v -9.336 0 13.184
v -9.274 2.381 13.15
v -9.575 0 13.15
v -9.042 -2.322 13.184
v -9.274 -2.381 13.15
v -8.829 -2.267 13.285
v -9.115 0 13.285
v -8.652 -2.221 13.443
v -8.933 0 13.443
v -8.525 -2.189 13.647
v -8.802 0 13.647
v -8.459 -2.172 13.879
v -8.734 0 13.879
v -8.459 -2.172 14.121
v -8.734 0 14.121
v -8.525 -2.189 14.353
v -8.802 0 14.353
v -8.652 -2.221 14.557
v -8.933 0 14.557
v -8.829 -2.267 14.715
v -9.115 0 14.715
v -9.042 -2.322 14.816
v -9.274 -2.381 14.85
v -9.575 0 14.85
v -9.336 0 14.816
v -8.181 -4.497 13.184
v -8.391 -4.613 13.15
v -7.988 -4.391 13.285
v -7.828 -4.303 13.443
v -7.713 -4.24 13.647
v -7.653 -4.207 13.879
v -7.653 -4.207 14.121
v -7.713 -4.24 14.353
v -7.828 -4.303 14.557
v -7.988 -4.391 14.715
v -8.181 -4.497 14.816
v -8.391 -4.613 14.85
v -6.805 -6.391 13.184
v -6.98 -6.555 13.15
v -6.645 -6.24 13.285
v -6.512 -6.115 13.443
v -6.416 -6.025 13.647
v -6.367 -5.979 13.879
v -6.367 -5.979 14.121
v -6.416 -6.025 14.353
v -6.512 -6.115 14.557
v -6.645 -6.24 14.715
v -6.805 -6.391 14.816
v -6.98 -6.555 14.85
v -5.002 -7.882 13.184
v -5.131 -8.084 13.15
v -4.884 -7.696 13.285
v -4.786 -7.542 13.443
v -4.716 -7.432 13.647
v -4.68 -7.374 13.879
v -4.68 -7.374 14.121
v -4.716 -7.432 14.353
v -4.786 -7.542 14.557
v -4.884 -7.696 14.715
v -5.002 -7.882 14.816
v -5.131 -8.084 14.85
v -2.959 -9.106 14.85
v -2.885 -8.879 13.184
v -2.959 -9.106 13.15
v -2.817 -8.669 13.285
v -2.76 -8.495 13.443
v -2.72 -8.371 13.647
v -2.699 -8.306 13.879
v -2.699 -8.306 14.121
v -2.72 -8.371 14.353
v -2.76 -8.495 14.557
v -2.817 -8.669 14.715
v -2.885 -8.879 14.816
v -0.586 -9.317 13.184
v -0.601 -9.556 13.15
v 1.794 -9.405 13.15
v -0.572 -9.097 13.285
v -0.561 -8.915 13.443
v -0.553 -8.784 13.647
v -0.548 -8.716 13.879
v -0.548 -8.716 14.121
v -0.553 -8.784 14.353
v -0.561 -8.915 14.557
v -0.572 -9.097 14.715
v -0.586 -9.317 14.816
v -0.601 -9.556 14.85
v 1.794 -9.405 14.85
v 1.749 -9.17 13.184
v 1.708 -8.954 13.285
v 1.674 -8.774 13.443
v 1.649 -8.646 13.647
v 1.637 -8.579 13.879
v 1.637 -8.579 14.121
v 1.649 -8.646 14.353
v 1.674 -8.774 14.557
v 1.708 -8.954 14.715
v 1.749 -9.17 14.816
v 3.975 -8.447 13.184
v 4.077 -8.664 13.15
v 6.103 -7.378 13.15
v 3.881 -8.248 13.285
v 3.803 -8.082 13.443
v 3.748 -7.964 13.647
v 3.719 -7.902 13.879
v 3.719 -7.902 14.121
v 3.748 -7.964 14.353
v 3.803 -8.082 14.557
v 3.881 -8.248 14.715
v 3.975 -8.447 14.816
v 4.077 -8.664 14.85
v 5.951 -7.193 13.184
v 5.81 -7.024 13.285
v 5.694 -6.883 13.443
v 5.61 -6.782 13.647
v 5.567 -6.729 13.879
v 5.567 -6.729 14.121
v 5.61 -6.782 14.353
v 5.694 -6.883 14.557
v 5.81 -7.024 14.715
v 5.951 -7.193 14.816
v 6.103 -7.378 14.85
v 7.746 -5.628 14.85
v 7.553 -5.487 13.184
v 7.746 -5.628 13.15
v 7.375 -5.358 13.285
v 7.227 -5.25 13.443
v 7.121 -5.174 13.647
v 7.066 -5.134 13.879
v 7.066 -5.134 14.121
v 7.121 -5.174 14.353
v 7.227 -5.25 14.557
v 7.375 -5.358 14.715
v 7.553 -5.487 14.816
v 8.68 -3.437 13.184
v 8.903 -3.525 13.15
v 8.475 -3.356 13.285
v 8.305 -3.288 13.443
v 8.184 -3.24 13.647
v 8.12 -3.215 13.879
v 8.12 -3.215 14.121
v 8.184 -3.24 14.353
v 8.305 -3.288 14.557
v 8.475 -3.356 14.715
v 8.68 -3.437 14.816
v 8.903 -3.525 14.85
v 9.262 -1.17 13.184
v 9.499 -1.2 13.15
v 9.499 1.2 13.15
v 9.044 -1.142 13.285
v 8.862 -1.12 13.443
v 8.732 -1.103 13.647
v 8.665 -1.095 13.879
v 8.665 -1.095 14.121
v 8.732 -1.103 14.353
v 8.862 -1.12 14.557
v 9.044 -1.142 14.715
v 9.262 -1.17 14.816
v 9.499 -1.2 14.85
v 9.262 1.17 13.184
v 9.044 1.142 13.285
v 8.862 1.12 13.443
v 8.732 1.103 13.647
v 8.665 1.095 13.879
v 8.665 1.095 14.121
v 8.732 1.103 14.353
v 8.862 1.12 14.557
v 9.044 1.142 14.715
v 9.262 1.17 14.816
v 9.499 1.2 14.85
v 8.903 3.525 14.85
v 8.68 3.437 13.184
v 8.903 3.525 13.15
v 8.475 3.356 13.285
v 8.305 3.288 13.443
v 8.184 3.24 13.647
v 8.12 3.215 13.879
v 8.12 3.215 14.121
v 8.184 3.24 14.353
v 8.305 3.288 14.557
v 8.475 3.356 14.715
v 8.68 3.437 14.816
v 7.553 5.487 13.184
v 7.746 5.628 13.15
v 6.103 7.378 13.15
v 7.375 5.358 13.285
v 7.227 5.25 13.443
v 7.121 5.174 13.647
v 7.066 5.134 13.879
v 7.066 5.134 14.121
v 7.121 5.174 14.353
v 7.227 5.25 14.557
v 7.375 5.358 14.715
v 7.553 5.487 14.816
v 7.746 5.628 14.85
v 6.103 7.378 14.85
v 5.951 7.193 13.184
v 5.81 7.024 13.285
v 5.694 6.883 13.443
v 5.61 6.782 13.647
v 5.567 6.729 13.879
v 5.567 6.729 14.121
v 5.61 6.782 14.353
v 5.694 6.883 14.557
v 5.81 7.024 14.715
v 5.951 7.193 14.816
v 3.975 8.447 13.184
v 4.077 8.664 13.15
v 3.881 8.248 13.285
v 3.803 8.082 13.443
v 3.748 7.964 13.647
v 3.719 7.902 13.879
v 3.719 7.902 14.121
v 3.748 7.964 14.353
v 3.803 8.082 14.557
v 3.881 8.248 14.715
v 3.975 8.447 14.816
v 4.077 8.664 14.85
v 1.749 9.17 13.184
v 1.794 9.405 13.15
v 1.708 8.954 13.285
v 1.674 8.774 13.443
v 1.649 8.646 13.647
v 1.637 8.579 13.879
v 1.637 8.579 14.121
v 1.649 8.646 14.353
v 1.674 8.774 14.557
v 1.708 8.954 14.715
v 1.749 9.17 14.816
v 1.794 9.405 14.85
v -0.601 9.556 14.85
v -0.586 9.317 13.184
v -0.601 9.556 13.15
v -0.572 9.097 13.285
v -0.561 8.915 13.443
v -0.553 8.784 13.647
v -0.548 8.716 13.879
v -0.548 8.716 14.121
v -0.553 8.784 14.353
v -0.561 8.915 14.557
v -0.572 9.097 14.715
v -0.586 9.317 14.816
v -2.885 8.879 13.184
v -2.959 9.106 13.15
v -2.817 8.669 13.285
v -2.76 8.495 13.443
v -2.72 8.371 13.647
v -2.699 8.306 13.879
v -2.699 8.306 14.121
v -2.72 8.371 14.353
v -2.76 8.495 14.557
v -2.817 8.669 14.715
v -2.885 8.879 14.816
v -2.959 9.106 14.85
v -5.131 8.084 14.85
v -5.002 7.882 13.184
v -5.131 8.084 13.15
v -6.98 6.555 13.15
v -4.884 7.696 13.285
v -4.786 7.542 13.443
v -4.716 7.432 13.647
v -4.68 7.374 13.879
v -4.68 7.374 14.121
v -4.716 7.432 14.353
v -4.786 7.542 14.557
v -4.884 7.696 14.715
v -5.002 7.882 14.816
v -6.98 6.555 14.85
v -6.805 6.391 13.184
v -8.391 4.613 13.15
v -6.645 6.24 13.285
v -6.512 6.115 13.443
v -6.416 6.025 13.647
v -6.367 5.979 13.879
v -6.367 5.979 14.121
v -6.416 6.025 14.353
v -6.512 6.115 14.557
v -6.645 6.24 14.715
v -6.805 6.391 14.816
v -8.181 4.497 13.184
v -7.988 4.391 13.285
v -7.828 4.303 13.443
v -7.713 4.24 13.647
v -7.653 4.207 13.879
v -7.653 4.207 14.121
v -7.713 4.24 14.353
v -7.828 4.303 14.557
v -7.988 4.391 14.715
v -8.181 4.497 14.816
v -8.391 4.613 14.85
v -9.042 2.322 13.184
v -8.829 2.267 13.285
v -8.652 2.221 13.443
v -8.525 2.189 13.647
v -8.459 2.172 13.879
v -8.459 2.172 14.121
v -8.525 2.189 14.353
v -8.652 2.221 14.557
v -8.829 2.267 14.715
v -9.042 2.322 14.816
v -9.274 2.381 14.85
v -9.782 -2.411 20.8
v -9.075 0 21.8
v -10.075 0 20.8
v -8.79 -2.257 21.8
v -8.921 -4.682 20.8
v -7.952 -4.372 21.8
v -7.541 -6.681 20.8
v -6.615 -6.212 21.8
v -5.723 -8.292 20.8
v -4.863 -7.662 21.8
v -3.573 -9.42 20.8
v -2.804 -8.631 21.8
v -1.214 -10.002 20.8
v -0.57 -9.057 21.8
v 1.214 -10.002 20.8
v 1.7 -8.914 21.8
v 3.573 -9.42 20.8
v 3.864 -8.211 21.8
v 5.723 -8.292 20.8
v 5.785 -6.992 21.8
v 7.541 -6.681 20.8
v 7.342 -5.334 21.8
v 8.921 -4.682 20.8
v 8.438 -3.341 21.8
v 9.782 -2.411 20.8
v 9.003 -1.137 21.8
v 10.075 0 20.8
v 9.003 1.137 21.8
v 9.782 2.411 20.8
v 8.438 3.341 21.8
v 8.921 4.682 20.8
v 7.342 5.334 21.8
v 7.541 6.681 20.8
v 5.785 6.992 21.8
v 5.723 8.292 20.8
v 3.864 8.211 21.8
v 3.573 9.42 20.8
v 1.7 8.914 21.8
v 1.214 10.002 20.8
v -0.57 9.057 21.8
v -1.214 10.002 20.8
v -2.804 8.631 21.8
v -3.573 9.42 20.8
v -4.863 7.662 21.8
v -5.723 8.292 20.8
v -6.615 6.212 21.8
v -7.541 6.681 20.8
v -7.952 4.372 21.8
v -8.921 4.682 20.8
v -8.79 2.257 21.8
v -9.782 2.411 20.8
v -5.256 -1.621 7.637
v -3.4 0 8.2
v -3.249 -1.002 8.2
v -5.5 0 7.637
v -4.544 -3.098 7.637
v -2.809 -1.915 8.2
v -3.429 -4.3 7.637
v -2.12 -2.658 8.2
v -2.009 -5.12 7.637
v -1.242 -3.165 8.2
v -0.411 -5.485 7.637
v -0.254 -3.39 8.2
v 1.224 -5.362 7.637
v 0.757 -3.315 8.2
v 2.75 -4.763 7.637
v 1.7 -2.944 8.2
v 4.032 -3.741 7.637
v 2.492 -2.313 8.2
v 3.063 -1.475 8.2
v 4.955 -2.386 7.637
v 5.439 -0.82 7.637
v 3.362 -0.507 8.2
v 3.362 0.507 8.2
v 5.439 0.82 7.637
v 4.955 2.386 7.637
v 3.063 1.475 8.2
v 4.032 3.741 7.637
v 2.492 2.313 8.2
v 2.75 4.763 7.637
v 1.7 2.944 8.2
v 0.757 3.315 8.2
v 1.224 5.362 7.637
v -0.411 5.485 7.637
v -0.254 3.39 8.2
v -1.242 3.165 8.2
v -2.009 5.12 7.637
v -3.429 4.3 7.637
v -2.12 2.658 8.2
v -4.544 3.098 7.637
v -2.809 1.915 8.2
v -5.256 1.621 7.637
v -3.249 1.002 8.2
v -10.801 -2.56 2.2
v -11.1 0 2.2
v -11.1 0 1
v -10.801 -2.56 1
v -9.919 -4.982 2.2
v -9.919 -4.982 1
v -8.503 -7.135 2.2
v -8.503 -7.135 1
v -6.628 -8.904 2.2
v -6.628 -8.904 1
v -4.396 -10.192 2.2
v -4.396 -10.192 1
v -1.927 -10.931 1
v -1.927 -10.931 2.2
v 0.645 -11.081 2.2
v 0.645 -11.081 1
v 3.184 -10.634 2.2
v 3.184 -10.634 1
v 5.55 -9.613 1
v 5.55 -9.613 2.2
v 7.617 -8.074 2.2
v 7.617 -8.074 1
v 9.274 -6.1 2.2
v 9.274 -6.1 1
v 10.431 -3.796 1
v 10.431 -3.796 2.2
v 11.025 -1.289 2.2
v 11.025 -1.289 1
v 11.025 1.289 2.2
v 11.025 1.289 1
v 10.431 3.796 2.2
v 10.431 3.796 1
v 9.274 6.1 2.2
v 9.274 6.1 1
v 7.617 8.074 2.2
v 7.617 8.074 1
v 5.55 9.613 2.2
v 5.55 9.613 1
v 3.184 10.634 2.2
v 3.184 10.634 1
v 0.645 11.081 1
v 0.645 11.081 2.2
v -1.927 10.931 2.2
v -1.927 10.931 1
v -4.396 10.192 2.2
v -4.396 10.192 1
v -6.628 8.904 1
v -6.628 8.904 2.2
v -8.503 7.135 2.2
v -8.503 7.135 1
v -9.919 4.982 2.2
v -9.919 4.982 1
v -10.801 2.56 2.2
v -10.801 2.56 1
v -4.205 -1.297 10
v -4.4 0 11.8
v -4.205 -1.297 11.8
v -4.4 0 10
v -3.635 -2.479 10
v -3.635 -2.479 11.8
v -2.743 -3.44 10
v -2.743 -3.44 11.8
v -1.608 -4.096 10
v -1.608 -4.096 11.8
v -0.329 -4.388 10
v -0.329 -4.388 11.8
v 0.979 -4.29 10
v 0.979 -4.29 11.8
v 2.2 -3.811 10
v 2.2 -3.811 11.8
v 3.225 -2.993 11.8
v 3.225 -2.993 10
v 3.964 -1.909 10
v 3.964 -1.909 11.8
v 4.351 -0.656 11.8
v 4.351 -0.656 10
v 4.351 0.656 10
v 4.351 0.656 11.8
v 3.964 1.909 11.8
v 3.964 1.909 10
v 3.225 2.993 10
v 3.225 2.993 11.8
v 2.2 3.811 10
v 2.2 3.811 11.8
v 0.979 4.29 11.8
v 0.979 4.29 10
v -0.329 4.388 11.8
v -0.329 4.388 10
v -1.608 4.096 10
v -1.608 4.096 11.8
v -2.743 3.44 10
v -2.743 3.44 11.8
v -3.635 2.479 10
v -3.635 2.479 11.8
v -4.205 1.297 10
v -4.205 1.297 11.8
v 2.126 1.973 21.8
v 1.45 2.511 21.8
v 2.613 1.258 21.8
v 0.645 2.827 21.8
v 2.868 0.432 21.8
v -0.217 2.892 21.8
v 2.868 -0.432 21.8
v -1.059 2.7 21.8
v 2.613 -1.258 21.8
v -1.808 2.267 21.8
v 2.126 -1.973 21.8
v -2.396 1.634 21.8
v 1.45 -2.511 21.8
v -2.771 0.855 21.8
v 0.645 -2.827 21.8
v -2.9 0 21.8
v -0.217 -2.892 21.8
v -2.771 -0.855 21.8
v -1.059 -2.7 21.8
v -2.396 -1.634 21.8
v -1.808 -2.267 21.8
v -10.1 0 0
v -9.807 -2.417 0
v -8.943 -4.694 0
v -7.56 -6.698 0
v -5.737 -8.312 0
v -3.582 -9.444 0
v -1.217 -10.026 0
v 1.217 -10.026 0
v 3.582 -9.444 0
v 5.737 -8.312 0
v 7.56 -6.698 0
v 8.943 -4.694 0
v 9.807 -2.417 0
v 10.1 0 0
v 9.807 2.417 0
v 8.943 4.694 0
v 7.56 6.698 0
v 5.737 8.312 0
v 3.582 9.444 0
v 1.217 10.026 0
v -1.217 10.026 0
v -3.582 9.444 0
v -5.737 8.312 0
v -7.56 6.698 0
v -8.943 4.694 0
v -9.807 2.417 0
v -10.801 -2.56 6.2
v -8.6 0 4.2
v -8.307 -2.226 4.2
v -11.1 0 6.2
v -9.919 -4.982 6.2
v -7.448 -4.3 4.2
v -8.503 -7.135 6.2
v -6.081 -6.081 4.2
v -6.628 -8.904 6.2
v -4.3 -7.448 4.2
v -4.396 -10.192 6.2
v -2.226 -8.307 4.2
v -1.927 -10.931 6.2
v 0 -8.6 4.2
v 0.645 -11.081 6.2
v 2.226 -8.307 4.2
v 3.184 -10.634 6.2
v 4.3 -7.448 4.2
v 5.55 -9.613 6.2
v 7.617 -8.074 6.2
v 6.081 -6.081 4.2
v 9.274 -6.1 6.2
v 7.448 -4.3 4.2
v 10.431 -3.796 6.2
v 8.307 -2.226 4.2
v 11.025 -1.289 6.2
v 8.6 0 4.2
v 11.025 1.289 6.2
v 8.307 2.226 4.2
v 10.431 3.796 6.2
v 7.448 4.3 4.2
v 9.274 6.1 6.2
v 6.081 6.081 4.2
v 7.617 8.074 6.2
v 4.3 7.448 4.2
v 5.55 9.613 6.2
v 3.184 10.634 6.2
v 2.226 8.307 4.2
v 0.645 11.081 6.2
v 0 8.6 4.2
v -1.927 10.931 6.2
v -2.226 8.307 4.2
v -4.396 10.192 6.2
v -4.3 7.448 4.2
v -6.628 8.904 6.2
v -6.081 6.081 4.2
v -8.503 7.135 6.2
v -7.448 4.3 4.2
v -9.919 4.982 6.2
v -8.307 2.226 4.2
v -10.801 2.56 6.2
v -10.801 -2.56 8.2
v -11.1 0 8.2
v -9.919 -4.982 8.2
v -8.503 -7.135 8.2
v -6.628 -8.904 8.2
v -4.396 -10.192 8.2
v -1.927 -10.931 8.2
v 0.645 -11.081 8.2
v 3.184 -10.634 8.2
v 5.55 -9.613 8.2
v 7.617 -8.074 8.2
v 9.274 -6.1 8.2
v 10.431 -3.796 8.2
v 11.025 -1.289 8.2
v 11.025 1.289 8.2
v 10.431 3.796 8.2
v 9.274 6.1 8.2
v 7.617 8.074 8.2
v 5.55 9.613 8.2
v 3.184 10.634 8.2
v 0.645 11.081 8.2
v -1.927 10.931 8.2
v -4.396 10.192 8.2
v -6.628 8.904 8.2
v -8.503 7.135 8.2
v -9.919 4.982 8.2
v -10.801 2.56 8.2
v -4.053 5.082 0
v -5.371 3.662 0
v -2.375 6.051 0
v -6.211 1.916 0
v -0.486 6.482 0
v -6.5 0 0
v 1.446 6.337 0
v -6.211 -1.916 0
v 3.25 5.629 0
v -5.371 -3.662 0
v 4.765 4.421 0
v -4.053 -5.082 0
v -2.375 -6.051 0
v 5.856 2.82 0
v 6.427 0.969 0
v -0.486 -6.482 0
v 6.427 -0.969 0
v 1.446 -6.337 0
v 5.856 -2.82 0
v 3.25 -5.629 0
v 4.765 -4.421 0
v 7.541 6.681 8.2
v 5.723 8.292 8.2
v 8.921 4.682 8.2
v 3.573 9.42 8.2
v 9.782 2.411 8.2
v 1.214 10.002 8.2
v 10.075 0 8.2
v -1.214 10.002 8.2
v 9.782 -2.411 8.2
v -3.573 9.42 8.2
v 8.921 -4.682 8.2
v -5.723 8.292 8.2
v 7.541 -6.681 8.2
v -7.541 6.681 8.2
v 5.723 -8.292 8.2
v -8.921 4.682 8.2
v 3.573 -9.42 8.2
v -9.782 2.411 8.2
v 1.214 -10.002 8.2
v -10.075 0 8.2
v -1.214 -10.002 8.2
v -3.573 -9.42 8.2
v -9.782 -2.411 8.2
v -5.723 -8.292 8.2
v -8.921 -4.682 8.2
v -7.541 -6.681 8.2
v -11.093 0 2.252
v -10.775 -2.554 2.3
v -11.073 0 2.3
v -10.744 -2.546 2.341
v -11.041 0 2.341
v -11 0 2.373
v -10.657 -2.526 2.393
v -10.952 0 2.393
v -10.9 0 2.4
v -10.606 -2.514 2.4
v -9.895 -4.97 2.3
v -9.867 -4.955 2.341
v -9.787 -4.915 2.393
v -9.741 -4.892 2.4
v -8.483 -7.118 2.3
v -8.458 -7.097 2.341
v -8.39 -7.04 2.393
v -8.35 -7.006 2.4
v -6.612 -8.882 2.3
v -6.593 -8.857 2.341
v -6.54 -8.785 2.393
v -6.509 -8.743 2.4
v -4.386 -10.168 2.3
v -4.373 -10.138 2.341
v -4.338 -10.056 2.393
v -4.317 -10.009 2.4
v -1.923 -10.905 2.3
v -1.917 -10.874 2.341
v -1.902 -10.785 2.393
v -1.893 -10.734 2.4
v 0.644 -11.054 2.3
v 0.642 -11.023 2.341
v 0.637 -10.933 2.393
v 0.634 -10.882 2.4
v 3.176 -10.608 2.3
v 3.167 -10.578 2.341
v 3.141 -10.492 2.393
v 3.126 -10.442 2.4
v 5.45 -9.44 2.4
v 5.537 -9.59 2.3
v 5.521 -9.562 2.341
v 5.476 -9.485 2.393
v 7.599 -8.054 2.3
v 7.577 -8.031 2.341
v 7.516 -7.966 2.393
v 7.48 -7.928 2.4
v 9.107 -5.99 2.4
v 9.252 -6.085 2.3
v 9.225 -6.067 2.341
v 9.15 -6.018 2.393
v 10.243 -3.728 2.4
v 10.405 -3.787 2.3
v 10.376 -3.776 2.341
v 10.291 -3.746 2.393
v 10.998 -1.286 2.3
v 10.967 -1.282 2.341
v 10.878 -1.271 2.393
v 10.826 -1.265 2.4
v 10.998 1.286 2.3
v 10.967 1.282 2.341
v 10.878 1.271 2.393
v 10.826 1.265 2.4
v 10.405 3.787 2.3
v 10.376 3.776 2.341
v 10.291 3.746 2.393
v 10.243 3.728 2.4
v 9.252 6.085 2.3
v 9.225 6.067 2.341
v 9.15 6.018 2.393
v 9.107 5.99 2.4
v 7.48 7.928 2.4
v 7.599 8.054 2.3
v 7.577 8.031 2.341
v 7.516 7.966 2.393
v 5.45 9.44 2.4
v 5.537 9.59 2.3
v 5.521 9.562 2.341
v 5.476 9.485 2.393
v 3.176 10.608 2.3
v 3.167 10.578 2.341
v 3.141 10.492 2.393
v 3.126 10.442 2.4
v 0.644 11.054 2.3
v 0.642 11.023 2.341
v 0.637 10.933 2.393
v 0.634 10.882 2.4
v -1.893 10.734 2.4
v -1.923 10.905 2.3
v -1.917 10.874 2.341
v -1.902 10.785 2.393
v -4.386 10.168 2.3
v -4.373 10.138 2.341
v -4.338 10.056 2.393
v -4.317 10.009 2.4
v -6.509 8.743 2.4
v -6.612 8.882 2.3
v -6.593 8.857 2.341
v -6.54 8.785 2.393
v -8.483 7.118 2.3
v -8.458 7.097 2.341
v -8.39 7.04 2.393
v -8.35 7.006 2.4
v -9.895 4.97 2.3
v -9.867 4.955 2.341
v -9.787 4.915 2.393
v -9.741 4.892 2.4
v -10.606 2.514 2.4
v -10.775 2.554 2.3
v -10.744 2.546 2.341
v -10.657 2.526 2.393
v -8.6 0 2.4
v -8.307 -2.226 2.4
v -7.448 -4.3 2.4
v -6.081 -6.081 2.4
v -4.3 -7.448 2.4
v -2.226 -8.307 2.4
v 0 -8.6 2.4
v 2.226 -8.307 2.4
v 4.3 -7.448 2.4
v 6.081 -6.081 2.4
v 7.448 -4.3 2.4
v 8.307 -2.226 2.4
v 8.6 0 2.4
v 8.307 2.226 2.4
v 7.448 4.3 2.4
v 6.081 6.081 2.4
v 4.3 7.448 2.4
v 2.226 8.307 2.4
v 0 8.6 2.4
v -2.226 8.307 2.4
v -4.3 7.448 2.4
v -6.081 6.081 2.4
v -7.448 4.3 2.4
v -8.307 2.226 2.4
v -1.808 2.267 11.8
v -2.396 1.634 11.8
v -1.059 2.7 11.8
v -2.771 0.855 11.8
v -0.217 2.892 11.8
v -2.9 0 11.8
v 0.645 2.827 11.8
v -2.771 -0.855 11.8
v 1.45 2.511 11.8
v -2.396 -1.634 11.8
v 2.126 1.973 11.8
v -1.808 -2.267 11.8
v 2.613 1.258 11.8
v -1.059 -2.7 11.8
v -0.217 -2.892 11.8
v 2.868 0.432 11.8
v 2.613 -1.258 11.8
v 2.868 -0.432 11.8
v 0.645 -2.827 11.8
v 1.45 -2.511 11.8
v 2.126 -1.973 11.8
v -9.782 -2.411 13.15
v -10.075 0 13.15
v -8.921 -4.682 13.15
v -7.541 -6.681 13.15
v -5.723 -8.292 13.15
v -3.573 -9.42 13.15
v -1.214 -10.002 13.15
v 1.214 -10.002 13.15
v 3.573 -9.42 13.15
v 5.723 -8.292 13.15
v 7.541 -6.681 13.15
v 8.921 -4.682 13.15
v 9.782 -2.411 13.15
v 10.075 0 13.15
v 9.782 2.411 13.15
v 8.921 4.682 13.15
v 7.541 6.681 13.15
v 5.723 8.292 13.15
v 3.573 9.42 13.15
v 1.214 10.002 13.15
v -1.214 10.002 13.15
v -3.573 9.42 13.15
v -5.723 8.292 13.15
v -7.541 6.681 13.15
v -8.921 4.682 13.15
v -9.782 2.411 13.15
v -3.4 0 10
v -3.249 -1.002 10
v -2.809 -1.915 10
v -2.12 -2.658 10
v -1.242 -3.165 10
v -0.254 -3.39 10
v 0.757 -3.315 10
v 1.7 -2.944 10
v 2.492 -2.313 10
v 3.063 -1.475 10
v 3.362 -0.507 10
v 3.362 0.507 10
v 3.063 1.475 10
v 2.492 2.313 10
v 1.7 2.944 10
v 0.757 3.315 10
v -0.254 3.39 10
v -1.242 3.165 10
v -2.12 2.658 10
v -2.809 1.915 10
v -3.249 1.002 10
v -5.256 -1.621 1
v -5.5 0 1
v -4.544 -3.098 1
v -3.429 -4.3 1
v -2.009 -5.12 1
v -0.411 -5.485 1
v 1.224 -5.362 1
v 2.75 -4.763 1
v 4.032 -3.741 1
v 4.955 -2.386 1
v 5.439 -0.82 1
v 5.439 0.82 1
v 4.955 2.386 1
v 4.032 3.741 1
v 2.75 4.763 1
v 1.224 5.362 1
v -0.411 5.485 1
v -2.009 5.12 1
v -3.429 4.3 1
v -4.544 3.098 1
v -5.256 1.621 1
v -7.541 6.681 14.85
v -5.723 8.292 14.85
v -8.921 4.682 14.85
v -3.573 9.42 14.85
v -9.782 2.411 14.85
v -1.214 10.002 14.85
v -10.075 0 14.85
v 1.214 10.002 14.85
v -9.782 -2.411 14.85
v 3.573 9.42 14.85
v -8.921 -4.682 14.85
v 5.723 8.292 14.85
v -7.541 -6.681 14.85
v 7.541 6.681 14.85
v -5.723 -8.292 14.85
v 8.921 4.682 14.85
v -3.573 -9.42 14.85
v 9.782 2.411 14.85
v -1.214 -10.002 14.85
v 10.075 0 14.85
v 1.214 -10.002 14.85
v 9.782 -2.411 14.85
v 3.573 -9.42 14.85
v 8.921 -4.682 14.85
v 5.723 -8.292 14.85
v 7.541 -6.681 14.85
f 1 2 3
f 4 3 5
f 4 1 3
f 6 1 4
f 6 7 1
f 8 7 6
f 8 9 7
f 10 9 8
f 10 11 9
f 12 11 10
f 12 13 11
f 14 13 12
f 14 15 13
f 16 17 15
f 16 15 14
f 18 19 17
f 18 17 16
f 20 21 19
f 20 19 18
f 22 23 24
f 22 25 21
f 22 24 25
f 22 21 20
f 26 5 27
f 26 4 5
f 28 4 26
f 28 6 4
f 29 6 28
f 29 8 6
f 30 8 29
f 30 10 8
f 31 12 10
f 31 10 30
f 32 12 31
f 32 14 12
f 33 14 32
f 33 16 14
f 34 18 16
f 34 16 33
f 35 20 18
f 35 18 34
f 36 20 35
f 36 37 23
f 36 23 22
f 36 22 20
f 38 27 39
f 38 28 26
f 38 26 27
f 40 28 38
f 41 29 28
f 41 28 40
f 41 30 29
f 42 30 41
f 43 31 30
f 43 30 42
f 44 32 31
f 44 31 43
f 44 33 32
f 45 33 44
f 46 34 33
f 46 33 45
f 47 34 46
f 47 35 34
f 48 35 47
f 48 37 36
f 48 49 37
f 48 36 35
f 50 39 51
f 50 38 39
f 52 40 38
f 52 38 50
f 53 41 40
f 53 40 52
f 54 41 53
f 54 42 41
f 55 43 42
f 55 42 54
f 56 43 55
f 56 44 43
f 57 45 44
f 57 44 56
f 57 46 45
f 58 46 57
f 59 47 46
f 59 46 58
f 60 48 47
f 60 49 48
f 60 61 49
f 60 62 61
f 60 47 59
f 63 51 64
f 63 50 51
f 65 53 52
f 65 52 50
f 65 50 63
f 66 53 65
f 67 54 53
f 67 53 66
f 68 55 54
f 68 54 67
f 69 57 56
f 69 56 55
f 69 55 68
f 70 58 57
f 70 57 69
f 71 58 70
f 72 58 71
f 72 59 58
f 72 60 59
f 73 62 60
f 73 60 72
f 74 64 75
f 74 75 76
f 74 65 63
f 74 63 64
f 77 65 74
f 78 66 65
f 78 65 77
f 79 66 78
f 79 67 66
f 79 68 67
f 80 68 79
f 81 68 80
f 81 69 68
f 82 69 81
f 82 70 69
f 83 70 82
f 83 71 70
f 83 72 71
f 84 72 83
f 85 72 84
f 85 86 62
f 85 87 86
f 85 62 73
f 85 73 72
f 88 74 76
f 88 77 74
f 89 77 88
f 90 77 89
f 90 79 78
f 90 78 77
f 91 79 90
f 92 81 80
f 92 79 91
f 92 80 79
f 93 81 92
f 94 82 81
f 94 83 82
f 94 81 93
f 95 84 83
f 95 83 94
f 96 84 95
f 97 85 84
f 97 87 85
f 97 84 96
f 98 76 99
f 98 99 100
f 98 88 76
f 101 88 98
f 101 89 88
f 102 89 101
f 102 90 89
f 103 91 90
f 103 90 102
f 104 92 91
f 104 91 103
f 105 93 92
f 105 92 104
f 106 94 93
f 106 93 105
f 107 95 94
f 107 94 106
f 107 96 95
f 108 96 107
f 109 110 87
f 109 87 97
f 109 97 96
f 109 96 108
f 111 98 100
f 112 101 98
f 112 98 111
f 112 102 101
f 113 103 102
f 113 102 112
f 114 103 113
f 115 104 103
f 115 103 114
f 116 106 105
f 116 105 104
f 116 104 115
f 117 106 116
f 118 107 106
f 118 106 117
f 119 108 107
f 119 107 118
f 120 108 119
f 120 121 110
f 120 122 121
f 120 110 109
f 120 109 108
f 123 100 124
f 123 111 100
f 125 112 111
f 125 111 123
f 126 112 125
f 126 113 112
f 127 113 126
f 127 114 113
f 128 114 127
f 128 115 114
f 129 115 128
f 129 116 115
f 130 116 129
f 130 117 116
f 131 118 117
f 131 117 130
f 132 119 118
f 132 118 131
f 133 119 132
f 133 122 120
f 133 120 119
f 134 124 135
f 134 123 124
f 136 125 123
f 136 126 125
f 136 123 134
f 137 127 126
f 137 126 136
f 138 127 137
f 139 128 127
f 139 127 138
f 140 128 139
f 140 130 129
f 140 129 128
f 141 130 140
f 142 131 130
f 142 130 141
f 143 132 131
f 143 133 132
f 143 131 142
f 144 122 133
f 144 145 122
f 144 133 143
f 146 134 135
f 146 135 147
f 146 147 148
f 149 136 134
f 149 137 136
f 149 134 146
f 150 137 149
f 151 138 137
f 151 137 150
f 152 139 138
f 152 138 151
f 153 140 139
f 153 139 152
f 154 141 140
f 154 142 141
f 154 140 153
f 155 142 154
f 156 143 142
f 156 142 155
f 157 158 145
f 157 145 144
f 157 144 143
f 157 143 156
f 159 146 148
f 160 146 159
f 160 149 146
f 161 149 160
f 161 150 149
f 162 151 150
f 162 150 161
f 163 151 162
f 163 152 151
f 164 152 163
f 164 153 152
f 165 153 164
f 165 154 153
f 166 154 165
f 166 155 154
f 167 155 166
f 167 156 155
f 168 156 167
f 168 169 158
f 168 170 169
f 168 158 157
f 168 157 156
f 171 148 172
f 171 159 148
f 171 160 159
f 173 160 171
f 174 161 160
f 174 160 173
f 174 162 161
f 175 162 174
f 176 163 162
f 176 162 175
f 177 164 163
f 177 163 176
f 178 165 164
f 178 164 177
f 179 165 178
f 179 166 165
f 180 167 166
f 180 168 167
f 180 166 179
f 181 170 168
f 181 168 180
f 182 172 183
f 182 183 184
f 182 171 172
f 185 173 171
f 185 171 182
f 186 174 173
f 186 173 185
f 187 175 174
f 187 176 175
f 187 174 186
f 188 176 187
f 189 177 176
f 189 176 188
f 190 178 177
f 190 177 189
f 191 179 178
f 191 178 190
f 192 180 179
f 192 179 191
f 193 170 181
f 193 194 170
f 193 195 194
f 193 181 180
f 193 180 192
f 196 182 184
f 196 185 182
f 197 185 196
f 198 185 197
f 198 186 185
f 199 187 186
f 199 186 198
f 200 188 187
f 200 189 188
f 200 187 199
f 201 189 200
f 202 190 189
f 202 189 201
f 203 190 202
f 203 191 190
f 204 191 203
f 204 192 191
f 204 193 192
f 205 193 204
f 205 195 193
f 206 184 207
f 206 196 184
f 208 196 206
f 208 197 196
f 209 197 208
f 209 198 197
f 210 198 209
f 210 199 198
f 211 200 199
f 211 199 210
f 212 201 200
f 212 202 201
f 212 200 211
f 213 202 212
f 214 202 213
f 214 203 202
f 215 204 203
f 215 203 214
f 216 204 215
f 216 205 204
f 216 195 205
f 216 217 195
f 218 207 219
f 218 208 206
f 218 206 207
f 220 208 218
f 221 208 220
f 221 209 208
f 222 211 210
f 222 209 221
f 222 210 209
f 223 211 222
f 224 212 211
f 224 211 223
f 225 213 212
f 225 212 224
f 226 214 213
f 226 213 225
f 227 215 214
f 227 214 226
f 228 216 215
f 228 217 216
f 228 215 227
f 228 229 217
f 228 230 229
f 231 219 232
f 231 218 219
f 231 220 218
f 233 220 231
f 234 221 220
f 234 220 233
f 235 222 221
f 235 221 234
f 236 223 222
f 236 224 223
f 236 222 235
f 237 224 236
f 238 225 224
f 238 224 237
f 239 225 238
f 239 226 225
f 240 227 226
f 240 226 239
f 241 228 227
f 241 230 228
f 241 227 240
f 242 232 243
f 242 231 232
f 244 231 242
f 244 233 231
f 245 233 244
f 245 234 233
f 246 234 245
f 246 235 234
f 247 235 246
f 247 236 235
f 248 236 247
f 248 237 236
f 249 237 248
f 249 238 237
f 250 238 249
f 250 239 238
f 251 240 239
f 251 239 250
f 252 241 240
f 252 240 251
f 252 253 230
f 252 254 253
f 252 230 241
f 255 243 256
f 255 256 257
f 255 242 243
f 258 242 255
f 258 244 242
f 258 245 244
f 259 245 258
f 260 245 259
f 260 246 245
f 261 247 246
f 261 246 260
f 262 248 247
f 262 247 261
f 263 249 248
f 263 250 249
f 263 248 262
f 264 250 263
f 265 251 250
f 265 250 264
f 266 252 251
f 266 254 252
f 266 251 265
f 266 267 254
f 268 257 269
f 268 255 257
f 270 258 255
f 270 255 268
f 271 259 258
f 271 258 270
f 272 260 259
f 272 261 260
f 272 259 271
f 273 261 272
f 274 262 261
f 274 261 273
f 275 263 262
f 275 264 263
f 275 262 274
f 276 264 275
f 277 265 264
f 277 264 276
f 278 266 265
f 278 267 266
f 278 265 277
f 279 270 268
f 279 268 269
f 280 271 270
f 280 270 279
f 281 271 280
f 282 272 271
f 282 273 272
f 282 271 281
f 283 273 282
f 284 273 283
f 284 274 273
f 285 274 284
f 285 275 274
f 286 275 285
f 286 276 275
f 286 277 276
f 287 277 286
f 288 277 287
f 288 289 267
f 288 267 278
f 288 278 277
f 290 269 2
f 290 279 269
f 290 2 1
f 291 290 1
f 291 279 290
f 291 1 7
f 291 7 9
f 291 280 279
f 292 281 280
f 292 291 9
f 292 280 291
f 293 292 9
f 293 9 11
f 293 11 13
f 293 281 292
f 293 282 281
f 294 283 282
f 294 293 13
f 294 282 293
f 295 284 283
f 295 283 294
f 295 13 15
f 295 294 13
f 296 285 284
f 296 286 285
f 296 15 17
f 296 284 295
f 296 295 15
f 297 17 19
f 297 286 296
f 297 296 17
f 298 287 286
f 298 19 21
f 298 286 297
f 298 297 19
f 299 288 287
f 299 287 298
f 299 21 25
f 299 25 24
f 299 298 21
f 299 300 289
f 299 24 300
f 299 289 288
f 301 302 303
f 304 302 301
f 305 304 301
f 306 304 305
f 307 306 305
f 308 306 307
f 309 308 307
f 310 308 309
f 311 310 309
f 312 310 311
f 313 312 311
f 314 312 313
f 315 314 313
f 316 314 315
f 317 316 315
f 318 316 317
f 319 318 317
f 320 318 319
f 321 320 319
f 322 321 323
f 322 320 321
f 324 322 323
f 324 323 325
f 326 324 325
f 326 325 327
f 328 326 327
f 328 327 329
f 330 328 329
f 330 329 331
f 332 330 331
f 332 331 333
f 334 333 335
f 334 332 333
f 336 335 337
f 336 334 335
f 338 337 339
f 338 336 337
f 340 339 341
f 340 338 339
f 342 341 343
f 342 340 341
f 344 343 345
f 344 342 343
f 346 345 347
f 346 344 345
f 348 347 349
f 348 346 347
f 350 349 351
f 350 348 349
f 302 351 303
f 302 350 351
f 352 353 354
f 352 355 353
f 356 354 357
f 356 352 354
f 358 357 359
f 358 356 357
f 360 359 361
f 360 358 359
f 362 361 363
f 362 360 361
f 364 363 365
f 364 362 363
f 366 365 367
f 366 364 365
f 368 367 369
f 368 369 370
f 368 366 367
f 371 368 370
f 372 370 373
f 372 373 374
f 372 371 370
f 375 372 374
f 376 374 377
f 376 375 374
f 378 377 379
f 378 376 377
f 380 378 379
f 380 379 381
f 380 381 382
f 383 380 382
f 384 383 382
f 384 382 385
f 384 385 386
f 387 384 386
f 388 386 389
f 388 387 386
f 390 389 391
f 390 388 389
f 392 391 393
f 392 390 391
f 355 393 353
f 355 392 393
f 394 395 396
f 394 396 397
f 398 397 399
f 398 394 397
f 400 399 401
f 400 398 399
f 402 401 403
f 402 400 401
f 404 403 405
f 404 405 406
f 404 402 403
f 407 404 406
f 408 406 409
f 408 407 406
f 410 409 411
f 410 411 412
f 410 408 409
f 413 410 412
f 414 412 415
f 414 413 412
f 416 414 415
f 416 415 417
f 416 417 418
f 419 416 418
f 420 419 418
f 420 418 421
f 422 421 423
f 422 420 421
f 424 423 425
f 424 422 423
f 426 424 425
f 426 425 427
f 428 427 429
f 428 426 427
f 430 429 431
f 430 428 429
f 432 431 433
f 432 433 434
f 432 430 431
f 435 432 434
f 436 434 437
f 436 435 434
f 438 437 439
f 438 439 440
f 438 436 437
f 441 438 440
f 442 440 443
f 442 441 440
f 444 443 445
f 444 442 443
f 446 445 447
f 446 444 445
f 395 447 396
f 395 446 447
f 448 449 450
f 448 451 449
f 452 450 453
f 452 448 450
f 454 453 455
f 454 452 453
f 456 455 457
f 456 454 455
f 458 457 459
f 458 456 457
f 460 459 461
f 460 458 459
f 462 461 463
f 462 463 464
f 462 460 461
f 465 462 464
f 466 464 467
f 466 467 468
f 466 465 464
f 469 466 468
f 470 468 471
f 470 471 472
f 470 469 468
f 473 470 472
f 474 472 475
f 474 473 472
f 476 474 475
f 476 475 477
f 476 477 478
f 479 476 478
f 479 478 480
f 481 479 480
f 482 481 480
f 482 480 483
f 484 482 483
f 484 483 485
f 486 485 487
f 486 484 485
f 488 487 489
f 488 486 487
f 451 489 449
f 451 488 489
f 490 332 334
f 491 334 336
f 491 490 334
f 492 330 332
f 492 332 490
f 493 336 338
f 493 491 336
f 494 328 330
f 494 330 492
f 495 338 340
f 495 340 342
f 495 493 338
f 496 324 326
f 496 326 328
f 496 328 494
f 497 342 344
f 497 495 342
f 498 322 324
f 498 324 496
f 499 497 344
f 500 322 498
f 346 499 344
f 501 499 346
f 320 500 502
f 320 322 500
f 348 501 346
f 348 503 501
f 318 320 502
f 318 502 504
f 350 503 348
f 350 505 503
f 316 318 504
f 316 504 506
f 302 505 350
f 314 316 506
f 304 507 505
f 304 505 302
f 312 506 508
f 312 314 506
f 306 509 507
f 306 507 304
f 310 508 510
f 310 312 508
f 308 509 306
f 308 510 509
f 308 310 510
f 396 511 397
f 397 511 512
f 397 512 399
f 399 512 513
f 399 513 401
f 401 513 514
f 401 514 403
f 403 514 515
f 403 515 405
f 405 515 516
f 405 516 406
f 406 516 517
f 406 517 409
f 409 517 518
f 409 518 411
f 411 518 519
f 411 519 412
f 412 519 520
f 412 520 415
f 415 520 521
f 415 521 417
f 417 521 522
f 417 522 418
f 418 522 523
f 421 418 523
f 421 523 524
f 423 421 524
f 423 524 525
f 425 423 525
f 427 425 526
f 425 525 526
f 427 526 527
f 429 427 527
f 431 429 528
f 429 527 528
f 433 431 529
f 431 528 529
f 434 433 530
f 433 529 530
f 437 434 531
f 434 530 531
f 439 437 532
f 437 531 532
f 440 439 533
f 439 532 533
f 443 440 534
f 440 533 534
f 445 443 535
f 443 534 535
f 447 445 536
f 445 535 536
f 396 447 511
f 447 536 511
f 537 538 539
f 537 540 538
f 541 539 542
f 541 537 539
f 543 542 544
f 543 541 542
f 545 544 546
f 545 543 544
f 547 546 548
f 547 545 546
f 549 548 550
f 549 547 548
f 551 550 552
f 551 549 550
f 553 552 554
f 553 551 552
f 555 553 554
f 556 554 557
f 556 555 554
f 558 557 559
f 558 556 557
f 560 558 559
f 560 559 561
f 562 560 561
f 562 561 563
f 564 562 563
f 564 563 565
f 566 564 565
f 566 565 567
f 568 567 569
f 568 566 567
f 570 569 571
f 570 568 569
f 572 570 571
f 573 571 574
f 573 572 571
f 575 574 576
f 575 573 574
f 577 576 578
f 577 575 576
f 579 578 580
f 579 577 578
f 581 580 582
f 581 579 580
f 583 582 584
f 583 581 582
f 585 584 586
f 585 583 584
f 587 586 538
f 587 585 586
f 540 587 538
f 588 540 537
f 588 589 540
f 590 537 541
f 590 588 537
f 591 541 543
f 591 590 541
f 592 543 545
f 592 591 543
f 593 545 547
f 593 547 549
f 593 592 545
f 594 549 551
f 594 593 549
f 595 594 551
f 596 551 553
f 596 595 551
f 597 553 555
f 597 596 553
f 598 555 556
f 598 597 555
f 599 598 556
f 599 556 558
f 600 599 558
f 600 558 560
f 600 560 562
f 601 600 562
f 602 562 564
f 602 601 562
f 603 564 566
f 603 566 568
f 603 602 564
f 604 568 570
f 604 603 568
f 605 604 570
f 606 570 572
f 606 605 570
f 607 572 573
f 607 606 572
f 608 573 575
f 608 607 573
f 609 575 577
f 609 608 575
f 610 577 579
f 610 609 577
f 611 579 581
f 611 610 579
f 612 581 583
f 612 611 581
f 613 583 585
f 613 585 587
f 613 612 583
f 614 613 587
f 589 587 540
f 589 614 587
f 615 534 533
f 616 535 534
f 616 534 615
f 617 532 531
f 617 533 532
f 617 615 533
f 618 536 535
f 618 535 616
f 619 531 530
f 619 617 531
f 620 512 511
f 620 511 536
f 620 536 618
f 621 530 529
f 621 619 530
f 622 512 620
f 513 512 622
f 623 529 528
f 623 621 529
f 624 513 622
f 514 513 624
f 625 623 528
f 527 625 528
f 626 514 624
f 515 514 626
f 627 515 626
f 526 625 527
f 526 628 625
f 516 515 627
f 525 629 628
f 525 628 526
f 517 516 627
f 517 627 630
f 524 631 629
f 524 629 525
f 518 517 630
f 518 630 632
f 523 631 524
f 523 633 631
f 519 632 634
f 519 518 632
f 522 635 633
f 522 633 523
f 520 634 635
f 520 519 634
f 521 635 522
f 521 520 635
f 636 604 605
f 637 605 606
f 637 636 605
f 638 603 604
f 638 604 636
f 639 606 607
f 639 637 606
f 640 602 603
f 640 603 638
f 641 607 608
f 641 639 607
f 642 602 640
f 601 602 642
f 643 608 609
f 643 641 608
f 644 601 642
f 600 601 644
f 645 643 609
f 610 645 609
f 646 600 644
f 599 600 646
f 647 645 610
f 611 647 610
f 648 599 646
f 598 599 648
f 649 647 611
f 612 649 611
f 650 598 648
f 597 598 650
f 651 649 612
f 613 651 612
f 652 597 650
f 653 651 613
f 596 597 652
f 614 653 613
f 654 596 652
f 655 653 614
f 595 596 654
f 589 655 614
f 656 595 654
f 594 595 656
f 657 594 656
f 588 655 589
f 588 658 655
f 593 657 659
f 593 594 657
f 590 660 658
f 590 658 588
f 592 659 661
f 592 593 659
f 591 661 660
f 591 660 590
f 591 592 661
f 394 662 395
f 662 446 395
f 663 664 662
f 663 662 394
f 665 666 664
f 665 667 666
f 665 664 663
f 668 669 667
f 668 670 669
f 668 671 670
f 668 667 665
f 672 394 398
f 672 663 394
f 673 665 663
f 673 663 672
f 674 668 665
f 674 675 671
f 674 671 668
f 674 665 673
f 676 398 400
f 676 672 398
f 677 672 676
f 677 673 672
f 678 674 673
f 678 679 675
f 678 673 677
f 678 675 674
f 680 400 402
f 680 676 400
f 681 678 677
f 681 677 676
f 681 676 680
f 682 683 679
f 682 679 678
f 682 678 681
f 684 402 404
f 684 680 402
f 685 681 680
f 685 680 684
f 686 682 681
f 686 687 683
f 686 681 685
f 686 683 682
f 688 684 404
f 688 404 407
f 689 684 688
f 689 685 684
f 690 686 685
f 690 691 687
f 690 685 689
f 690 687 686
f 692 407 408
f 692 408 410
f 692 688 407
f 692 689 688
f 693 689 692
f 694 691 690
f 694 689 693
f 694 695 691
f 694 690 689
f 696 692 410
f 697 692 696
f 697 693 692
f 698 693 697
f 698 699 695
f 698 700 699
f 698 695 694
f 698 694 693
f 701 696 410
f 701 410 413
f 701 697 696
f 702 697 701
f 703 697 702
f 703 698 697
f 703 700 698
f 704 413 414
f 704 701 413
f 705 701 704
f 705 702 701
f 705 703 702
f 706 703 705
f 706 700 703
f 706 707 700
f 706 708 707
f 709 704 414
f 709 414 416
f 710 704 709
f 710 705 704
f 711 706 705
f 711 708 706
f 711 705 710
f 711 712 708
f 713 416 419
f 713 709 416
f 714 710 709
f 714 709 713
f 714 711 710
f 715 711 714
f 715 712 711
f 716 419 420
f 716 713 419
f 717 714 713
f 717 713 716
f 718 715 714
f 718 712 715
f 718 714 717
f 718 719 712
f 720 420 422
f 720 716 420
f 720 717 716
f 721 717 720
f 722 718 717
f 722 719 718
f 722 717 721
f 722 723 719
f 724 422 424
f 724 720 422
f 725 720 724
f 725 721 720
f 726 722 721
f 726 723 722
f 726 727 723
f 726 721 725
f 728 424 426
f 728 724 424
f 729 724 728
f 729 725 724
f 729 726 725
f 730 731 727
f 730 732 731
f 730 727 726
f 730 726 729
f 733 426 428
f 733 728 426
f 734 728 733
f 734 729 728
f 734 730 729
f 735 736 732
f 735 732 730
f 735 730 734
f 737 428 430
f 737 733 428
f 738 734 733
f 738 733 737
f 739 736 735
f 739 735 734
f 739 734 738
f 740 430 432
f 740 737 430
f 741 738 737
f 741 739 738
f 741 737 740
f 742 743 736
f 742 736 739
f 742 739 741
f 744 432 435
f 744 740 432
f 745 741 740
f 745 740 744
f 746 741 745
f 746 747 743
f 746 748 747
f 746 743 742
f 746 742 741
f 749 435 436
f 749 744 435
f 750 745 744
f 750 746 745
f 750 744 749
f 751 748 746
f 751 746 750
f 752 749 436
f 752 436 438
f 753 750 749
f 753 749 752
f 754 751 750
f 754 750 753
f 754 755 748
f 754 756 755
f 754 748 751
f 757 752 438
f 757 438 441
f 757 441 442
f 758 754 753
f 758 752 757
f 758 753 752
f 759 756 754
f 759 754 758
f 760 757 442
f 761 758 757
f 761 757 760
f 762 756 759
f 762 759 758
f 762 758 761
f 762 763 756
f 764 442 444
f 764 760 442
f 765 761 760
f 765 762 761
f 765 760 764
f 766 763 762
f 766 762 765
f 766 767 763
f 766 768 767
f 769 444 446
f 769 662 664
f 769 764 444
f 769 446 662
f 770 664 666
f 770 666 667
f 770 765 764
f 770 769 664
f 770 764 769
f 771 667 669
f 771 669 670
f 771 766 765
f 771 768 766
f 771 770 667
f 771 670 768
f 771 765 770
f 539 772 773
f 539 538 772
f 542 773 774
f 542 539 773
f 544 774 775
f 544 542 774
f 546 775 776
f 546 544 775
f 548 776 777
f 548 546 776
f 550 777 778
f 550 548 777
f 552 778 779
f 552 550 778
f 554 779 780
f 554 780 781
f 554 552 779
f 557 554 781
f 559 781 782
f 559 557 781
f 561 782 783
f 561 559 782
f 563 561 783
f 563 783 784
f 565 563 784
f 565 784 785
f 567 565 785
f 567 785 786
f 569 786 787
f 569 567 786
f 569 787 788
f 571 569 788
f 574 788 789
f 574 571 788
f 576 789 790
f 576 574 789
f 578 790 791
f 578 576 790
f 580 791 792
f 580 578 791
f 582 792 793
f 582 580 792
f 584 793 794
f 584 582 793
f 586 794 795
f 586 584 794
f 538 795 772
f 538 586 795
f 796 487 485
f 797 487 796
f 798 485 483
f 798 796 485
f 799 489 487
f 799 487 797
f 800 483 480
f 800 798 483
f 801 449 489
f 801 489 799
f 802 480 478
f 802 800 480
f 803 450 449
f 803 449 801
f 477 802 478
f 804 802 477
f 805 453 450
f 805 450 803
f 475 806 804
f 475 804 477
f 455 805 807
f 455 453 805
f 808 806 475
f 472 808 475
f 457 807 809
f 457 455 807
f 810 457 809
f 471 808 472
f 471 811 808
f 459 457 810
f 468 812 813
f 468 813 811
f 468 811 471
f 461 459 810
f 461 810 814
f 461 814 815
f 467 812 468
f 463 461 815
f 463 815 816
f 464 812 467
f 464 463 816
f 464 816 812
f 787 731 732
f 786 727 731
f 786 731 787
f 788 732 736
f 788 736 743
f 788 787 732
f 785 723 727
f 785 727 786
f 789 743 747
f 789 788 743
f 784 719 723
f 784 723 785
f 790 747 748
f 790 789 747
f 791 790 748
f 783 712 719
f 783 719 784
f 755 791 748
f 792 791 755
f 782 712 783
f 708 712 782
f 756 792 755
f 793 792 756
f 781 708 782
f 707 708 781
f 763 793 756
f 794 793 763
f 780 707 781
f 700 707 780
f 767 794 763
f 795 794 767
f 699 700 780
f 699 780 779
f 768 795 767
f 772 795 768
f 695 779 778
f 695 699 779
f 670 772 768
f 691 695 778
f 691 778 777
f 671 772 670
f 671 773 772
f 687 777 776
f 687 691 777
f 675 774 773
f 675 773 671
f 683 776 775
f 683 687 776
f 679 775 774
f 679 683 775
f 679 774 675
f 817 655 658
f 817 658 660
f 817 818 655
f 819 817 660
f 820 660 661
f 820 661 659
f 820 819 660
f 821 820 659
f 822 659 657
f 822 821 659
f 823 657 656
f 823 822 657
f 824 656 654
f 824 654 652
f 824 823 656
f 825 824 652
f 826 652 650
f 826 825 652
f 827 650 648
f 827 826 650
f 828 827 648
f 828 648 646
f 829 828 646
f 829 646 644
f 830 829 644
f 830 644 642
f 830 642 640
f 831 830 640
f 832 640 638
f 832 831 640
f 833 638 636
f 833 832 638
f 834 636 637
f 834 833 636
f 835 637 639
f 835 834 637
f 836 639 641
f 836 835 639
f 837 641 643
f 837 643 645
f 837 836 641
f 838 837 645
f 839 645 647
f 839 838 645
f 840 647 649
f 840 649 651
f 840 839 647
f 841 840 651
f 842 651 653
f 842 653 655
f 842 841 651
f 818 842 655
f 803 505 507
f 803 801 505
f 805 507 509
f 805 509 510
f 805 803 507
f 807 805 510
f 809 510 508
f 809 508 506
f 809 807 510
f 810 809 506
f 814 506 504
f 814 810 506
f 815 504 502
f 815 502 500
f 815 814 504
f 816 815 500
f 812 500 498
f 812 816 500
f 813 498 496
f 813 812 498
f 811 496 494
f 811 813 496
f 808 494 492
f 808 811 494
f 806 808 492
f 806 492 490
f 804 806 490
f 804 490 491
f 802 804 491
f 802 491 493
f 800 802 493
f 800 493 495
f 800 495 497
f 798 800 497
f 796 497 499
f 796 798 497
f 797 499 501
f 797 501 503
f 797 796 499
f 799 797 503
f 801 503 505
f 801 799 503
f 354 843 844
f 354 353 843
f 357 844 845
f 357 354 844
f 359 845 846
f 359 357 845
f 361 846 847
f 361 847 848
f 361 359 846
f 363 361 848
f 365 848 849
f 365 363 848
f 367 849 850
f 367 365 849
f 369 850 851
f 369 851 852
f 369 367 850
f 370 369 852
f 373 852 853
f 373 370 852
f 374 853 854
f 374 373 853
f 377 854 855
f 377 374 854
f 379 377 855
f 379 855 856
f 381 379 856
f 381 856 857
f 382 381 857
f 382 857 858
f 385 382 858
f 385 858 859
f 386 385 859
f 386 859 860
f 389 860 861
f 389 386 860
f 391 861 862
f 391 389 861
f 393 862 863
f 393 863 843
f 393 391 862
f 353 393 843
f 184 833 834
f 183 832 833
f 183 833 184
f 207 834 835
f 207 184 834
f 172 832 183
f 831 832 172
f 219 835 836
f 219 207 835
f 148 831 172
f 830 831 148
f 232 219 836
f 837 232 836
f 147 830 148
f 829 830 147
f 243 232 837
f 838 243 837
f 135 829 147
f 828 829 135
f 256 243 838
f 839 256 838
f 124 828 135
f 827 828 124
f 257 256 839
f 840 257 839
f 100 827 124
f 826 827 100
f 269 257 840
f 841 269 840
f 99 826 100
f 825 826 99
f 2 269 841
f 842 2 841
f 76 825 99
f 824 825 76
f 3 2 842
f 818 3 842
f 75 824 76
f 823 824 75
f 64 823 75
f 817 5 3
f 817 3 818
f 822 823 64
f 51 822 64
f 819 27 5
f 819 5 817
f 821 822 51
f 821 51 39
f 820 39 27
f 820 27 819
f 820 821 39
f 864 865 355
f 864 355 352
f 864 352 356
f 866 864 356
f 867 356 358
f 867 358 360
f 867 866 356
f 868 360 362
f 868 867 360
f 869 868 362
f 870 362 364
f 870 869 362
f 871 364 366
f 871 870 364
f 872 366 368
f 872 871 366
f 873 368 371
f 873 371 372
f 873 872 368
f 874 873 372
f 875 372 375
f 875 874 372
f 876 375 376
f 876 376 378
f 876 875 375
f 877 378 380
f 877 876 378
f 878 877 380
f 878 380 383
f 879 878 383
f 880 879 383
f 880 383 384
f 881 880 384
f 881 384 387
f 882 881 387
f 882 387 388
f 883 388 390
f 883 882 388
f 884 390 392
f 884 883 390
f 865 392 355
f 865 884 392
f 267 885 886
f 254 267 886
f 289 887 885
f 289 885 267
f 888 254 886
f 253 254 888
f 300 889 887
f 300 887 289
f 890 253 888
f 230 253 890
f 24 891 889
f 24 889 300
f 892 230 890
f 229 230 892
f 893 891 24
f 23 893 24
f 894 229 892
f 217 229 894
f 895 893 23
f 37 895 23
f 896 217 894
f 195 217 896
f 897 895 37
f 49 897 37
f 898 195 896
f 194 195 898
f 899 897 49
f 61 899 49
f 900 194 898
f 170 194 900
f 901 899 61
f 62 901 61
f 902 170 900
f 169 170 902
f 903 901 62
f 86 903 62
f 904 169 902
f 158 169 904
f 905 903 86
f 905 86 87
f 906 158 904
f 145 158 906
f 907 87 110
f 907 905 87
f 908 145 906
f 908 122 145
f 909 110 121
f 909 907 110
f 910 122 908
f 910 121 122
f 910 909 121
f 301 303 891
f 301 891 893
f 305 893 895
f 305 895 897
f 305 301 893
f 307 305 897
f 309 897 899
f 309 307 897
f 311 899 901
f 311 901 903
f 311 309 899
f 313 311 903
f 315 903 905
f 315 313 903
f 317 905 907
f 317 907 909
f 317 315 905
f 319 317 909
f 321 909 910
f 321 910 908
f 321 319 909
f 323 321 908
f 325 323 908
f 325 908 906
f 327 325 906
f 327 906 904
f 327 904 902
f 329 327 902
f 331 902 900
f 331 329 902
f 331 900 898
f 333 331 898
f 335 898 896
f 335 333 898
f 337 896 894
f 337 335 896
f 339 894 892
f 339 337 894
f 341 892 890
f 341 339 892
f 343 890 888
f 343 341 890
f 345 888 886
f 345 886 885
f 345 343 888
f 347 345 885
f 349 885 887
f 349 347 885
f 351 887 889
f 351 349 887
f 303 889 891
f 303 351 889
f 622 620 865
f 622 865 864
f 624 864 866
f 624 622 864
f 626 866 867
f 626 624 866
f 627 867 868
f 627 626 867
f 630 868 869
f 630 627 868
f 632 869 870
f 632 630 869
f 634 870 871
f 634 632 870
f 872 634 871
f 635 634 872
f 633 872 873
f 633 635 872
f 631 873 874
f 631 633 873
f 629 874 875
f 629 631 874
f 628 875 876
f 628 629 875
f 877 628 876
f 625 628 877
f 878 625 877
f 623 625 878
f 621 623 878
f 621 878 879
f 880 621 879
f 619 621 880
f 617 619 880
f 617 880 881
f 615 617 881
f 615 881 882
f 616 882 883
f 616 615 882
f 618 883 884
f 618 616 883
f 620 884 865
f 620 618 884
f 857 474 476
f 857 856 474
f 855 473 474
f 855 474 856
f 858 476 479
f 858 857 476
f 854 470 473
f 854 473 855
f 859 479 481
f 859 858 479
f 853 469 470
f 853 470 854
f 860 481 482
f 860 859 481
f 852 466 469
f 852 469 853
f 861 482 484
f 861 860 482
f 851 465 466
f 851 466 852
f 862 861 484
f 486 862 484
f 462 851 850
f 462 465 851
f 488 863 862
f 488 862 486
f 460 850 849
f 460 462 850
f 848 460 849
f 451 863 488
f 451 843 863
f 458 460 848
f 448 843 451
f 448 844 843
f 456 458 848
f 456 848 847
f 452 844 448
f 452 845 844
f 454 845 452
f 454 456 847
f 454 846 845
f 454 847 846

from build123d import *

# Parameters (mm, degrees)
CHAMFER_1_SIZE = 1
CHAMFER_2_SIZE = 1
FILLET_1_R     = 0.2


with BuildPart() as part:
    # 스케치3 → 회전2 (revolve)
    with BuildSketch(Plane(origin=(0, 0, 0), x_dir=(1, 0, 0), z_dir=(0, 1, 0)), mode=Mode.PRIVATE) as revolve_2_sk:
        with BuildLine():
            Line((11.1, 0), (11.1, -2.4))
            Line((11.1, -2.4), (8.6, -2.4))
            Line((8.6, -2.4), (8.6, -4.2))
            Line((8.6, -4.2), (11.1, -6.2))
            Line((11.1, -6.2), (11.1, -8.2))
            Line((11.1, -8.2), (10.075, -8.2))
            Line((10.075, -8.2), (10.075, -13.15))
            Line((10.075, -13.15), (9.575, -13.15))
            ThreePointArc((9.575, -13.15), (8.725, -14), (9.575, -14.85))
            Line((9.575, -14.85), (10.075, -14.85))
            Line((10.075, -14.85), (10.075, -21.8))
            Line((10.075, -21.8), (2.9, -21.8))
            Line((2.9, -21.8), (2.9, -11.8))
            Line((2.9, -11.8), (4.4, -11.8))
            Line((4.4, -11.8), (4.4, -10))
            Line((4.4, -10), (3.4, -10))
            Line((3.4, -10), (3.4, -8.2))
            Line((3.4, -8.2), (5.5, -7.637306696))
            Line((5.5, -7.637306696), (5.5, 0))
            Line((5.5, 0), (11.1, 0))
        make_face()
    revolve(revolve_2_sk.sketch.rotate(Axis((0, 0, 0), (0, 0, 1)), 180), axis=Axis((0, 0, 0), (0, 0, 1)))

    # 모따기1
    chamfer_1_edges = [part.edges().sort_by_distance(p)[0] for p in [
        (10.075, 0, 21.8),
        (5.5, 0, 0),
    ]]
    chamfer(chamfer_1_edges, length=CHAMFER_1_SIZE)

    # 모따기2
    chamfer_2_edges = [part.edges().sort_by_distance(p)[0] for p in [
        (11.1, 0, 0),
    ]]
    chamfer(chamfer_2_edges, length=CHAMFER_2_SIZE)

    # 필렛1
    fillet_1_edges = [part.edges().sort_by_distance(p)[0] for p in [
        (11.1, 0, 2.4),
    ]]
    fillet(fillet_1_edges, radius=FILLET_1_R)


solid = part.part
